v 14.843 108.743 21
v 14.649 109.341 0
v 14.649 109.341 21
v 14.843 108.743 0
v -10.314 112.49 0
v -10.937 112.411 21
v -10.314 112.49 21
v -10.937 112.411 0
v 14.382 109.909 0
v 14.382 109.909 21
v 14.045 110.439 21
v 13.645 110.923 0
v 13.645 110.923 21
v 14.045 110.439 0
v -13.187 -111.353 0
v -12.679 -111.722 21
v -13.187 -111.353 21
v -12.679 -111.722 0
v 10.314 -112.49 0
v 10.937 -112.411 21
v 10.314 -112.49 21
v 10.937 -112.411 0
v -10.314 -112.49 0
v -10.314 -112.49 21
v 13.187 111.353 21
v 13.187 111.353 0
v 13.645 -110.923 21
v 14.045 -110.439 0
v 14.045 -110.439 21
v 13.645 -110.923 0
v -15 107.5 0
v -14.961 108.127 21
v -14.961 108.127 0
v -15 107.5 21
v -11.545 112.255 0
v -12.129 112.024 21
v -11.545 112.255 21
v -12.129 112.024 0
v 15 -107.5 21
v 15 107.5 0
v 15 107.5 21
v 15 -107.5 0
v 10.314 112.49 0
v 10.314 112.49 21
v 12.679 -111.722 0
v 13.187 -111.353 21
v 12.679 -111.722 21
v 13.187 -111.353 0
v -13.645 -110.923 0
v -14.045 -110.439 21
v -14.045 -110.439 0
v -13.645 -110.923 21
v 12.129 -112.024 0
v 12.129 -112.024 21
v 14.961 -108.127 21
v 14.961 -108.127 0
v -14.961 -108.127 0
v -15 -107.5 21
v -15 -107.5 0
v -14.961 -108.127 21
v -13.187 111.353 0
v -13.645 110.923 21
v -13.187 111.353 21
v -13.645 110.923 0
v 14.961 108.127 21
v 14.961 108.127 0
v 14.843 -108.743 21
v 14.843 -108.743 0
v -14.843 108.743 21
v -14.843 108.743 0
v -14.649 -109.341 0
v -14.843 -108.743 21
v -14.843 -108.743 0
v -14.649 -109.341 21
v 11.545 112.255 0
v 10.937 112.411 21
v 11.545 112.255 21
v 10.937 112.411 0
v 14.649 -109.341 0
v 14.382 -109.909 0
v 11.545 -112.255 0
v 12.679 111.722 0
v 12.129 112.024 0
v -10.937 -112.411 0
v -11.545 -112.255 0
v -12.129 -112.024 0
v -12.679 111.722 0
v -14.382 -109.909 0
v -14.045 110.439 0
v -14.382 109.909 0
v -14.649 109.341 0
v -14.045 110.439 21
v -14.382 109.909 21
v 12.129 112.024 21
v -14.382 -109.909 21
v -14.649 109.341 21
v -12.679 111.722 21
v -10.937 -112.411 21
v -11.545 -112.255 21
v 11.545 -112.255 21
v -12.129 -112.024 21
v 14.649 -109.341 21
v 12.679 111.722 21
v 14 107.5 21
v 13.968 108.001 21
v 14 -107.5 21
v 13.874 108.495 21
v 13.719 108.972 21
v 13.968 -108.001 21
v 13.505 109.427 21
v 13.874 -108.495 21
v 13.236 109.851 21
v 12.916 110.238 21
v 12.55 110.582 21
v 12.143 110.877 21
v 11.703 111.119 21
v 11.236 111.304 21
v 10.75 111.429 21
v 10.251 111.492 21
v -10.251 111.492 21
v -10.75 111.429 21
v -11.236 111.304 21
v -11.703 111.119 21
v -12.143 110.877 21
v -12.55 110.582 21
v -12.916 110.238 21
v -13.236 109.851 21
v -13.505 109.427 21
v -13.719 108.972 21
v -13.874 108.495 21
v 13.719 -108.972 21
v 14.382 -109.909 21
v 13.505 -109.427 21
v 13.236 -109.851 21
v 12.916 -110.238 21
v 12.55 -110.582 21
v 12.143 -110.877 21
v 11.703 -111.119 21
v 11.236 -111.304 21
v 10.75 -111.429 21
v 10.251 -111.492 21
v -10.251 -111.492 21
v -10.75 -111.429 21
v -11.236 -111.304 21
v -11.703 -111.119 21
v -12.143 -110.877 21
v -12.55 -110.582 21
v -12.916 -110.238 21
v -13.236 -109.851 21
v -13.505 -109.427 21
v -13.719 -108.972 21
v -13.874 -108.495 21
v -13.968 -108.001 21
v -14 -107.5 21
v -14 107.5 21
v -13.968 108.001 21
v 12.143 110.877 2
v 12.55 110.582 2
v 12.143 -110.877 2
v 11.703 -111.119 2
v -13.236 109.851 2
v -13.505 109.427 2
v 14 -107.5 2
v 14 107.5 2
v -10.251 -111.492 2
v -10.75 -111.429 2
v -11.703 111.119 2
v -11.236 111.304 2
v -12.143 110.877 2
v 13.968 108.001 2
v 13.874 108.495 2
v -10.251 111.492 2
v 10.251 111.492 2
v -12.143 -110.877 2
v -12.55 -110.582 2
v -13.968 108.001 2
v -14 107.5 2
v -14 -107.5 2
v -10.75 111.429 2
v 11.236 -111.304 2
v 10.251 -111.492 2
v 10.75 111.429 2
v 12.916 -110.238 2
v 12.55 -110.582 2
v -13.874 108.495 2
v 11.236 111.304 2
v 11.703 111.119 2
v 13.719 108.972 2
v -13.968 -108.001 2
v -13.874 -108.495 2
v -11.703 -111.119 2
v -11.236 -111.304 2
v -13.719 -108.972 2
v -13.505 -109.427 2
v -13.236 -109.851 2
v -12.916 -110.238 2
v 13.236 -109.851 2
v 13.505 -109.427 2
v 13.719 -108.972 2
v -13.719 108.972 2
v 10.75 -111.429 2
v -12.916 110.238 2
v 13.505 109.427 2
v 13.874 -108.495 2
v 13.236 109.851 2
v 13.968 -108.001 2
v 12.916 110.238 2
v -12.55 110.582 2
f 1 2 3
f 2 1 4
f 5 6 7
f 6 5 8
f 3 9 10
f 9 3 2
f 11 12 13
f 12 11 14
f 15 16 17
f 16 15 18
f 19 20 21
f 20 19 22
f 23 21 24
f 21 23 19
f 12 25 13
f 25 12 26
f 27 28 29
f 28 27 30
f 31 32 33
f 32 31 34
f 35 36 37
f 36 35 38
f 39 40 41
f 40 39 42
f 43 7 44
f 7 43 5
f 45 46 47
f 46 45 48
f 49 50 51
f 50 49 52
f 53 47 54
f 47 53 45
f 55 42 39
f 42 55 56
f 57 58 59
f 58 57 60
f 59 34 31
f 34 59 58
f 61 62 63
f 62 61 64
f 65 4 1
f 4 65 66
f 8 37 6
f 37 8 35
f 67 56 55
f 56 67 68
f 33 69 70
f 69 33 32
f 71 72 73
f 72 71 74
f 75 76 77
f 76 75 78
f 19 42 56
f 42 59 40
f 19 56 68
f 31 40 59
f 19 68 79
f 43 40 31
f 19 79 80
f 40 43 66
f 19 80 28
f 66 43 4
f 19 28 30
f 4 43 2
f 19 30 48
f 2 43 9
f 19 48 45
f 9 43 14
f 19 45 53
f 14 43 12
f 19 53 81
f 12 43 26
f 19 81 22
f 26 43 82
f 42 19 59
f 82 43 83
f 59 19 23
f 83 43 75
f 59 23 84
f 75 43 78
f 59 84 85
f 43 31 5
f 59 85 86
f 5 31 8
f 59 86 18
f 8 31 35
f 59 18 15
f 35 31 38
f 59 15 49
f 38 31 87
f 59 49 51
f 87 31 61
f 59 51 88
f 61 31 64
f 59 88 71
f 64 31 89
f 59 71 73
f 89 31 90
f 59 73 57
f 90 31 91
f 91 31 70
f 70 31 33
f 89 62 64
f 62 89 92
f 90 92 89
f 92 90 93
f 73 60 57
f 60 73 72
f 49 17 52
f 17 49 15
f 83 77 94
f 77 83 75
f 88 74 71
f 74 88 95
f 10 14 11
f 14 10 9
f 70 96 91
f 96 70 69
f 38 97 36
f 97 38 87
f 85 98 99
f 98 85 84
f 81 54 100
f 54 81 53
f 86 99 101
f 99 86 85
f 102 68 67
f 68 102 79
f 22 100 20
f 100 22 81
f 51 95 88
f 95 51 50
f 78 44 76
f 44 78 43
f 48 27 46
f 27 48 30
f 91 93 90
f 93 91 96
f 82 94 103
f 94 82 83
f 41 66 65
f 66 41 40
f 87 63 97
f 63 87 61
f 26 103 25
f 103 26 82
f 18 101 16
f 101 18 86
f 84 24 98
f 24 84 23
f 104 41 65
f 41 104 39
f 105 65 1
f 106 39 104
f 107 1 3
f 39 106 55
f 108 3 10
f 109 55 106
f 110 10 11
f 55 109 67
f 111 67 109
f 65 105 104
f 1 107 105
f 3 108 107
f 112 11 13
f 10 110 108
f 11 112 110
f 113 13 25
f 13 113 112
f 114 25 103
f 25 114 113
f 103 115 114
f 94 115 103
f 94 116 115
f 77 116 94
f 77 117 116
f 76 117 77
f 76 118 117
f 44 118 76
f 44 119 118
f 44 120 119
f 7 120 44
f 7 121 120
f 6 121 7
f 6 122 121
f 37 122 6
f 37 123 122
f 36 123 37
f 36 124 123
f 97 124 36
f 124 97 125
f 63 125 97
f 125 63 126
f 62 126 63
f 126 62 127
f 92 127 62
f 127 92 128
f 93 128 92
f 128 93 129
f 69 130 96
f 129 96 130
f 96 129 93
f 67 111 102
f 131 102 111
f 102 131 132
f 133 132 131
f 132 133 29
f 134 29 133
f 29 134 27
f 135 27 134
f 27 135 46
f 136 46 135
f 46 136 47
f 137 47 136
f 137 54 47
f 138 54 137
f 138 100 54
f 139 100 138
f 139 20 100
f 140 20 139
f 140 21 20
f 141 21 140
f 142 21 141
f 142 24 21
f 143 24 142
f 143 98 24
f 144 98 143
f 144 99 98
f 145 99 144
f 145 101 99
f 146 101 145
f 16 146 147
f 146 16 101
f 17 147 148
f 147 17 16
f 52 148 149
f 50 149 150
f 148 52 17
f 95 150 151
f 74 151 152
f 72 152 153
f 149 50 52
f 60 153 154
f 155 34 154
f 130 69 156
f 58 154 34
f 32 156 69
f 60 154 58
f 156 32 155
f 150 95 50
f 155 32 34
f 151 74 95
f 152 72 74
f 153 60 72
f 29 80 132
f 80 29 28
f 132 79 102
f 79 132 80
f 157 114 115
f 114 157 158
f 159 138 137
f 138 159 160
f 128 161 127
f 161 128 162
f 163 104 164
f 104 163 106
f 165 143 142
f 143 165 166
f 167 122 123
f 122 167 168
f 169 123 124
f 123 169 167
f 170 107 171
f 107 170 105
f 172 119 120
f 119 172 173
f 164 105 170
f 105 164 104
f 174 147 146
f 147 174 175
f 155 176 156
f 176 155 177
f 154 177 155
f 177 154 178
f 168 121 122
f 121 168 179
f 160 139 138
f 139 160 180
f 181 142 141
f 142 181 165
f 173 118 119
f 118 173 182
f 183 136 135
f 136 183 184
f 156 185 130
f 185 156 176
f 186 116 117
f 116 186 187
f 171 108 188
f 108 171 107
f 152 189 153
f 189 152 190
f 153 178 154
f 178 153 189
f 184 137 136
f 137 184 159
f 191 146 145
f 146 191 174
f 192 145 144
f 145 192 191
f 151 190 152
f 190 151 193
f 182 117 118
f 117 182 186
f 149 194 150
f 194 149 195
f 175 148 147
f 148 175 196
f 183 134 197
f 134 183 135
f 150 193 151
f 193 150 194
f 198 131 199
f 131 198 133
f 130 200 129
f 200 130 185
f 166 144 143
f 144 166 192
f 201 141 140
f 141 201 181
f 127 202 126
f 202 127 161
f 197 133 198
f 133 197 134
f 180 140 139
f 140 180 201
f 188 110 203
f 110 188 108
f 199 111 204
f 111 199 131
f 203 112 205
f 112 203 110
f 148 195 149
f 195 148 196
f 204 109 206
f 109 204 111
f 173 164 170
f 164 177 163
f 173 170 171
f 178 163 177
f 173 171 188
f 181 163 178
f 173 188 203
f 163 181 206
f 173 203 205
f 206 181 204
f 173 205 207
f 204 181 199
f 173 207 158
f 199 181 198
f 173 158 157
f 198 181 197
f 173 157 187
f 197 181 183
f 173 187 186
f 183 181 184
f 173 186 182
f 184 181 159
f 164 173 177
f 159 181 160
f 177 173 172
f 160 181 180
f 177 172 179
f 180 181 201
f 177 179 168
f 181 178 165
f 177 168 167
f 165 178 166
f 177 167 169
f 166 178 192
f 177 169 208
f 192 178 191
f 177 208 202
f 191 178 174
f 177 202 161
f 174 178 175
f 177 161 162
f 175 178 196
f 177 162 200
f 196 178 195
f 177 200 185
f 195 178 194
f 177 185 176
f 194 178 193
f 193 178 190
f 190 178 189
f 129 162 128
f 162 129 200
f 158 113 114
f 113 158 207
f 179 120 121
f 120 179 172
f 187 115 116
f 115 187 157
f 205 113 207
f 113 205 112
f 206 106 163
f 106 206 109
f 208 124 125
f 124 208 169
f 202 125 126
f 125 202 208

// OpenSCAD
$fn = 50;


difference() {
	union() {
		hull() {
			translate(v = [-10.0000000000, 107.5000000000, 0]) {
				cylinder(h = 21, r = 5);
			}
			translate(v = [10.0000000000, 107.5000000000, 0]) {
				cylinder(h = 21, r = 5);
			}
			translate(v = [-10.0000000000, -107.5000000000, 0]) {
				cylinder(h = 21, r = 5);
			}
			translate(v = [10.0000000000, -107.5000000000, 0]) {
				cylinder(h = 21, r = 5);
			}
		}
	}
	union() {
		translate(v = [0, 0, 2]) {
			hull() {
				translate(v = [-10.0000000000, 107.5000000000, 0]) {
					cylinder(h = 19, r = 4);
				}
				translate(v = [10.0000000000, 107.5000000000, 0]) {
					cylinder(h = 19, r = 4);
				}
				translate(v = [-10.0000000000, -107.5000000000, 0]) {
					cylinder(h = 19, r = 4);
				}
				translate(v = [10.0000000000, -107.5000000000, 0]) {
					cylinder(h = 19, r = 4);
				}
			}
		}
	}
}
